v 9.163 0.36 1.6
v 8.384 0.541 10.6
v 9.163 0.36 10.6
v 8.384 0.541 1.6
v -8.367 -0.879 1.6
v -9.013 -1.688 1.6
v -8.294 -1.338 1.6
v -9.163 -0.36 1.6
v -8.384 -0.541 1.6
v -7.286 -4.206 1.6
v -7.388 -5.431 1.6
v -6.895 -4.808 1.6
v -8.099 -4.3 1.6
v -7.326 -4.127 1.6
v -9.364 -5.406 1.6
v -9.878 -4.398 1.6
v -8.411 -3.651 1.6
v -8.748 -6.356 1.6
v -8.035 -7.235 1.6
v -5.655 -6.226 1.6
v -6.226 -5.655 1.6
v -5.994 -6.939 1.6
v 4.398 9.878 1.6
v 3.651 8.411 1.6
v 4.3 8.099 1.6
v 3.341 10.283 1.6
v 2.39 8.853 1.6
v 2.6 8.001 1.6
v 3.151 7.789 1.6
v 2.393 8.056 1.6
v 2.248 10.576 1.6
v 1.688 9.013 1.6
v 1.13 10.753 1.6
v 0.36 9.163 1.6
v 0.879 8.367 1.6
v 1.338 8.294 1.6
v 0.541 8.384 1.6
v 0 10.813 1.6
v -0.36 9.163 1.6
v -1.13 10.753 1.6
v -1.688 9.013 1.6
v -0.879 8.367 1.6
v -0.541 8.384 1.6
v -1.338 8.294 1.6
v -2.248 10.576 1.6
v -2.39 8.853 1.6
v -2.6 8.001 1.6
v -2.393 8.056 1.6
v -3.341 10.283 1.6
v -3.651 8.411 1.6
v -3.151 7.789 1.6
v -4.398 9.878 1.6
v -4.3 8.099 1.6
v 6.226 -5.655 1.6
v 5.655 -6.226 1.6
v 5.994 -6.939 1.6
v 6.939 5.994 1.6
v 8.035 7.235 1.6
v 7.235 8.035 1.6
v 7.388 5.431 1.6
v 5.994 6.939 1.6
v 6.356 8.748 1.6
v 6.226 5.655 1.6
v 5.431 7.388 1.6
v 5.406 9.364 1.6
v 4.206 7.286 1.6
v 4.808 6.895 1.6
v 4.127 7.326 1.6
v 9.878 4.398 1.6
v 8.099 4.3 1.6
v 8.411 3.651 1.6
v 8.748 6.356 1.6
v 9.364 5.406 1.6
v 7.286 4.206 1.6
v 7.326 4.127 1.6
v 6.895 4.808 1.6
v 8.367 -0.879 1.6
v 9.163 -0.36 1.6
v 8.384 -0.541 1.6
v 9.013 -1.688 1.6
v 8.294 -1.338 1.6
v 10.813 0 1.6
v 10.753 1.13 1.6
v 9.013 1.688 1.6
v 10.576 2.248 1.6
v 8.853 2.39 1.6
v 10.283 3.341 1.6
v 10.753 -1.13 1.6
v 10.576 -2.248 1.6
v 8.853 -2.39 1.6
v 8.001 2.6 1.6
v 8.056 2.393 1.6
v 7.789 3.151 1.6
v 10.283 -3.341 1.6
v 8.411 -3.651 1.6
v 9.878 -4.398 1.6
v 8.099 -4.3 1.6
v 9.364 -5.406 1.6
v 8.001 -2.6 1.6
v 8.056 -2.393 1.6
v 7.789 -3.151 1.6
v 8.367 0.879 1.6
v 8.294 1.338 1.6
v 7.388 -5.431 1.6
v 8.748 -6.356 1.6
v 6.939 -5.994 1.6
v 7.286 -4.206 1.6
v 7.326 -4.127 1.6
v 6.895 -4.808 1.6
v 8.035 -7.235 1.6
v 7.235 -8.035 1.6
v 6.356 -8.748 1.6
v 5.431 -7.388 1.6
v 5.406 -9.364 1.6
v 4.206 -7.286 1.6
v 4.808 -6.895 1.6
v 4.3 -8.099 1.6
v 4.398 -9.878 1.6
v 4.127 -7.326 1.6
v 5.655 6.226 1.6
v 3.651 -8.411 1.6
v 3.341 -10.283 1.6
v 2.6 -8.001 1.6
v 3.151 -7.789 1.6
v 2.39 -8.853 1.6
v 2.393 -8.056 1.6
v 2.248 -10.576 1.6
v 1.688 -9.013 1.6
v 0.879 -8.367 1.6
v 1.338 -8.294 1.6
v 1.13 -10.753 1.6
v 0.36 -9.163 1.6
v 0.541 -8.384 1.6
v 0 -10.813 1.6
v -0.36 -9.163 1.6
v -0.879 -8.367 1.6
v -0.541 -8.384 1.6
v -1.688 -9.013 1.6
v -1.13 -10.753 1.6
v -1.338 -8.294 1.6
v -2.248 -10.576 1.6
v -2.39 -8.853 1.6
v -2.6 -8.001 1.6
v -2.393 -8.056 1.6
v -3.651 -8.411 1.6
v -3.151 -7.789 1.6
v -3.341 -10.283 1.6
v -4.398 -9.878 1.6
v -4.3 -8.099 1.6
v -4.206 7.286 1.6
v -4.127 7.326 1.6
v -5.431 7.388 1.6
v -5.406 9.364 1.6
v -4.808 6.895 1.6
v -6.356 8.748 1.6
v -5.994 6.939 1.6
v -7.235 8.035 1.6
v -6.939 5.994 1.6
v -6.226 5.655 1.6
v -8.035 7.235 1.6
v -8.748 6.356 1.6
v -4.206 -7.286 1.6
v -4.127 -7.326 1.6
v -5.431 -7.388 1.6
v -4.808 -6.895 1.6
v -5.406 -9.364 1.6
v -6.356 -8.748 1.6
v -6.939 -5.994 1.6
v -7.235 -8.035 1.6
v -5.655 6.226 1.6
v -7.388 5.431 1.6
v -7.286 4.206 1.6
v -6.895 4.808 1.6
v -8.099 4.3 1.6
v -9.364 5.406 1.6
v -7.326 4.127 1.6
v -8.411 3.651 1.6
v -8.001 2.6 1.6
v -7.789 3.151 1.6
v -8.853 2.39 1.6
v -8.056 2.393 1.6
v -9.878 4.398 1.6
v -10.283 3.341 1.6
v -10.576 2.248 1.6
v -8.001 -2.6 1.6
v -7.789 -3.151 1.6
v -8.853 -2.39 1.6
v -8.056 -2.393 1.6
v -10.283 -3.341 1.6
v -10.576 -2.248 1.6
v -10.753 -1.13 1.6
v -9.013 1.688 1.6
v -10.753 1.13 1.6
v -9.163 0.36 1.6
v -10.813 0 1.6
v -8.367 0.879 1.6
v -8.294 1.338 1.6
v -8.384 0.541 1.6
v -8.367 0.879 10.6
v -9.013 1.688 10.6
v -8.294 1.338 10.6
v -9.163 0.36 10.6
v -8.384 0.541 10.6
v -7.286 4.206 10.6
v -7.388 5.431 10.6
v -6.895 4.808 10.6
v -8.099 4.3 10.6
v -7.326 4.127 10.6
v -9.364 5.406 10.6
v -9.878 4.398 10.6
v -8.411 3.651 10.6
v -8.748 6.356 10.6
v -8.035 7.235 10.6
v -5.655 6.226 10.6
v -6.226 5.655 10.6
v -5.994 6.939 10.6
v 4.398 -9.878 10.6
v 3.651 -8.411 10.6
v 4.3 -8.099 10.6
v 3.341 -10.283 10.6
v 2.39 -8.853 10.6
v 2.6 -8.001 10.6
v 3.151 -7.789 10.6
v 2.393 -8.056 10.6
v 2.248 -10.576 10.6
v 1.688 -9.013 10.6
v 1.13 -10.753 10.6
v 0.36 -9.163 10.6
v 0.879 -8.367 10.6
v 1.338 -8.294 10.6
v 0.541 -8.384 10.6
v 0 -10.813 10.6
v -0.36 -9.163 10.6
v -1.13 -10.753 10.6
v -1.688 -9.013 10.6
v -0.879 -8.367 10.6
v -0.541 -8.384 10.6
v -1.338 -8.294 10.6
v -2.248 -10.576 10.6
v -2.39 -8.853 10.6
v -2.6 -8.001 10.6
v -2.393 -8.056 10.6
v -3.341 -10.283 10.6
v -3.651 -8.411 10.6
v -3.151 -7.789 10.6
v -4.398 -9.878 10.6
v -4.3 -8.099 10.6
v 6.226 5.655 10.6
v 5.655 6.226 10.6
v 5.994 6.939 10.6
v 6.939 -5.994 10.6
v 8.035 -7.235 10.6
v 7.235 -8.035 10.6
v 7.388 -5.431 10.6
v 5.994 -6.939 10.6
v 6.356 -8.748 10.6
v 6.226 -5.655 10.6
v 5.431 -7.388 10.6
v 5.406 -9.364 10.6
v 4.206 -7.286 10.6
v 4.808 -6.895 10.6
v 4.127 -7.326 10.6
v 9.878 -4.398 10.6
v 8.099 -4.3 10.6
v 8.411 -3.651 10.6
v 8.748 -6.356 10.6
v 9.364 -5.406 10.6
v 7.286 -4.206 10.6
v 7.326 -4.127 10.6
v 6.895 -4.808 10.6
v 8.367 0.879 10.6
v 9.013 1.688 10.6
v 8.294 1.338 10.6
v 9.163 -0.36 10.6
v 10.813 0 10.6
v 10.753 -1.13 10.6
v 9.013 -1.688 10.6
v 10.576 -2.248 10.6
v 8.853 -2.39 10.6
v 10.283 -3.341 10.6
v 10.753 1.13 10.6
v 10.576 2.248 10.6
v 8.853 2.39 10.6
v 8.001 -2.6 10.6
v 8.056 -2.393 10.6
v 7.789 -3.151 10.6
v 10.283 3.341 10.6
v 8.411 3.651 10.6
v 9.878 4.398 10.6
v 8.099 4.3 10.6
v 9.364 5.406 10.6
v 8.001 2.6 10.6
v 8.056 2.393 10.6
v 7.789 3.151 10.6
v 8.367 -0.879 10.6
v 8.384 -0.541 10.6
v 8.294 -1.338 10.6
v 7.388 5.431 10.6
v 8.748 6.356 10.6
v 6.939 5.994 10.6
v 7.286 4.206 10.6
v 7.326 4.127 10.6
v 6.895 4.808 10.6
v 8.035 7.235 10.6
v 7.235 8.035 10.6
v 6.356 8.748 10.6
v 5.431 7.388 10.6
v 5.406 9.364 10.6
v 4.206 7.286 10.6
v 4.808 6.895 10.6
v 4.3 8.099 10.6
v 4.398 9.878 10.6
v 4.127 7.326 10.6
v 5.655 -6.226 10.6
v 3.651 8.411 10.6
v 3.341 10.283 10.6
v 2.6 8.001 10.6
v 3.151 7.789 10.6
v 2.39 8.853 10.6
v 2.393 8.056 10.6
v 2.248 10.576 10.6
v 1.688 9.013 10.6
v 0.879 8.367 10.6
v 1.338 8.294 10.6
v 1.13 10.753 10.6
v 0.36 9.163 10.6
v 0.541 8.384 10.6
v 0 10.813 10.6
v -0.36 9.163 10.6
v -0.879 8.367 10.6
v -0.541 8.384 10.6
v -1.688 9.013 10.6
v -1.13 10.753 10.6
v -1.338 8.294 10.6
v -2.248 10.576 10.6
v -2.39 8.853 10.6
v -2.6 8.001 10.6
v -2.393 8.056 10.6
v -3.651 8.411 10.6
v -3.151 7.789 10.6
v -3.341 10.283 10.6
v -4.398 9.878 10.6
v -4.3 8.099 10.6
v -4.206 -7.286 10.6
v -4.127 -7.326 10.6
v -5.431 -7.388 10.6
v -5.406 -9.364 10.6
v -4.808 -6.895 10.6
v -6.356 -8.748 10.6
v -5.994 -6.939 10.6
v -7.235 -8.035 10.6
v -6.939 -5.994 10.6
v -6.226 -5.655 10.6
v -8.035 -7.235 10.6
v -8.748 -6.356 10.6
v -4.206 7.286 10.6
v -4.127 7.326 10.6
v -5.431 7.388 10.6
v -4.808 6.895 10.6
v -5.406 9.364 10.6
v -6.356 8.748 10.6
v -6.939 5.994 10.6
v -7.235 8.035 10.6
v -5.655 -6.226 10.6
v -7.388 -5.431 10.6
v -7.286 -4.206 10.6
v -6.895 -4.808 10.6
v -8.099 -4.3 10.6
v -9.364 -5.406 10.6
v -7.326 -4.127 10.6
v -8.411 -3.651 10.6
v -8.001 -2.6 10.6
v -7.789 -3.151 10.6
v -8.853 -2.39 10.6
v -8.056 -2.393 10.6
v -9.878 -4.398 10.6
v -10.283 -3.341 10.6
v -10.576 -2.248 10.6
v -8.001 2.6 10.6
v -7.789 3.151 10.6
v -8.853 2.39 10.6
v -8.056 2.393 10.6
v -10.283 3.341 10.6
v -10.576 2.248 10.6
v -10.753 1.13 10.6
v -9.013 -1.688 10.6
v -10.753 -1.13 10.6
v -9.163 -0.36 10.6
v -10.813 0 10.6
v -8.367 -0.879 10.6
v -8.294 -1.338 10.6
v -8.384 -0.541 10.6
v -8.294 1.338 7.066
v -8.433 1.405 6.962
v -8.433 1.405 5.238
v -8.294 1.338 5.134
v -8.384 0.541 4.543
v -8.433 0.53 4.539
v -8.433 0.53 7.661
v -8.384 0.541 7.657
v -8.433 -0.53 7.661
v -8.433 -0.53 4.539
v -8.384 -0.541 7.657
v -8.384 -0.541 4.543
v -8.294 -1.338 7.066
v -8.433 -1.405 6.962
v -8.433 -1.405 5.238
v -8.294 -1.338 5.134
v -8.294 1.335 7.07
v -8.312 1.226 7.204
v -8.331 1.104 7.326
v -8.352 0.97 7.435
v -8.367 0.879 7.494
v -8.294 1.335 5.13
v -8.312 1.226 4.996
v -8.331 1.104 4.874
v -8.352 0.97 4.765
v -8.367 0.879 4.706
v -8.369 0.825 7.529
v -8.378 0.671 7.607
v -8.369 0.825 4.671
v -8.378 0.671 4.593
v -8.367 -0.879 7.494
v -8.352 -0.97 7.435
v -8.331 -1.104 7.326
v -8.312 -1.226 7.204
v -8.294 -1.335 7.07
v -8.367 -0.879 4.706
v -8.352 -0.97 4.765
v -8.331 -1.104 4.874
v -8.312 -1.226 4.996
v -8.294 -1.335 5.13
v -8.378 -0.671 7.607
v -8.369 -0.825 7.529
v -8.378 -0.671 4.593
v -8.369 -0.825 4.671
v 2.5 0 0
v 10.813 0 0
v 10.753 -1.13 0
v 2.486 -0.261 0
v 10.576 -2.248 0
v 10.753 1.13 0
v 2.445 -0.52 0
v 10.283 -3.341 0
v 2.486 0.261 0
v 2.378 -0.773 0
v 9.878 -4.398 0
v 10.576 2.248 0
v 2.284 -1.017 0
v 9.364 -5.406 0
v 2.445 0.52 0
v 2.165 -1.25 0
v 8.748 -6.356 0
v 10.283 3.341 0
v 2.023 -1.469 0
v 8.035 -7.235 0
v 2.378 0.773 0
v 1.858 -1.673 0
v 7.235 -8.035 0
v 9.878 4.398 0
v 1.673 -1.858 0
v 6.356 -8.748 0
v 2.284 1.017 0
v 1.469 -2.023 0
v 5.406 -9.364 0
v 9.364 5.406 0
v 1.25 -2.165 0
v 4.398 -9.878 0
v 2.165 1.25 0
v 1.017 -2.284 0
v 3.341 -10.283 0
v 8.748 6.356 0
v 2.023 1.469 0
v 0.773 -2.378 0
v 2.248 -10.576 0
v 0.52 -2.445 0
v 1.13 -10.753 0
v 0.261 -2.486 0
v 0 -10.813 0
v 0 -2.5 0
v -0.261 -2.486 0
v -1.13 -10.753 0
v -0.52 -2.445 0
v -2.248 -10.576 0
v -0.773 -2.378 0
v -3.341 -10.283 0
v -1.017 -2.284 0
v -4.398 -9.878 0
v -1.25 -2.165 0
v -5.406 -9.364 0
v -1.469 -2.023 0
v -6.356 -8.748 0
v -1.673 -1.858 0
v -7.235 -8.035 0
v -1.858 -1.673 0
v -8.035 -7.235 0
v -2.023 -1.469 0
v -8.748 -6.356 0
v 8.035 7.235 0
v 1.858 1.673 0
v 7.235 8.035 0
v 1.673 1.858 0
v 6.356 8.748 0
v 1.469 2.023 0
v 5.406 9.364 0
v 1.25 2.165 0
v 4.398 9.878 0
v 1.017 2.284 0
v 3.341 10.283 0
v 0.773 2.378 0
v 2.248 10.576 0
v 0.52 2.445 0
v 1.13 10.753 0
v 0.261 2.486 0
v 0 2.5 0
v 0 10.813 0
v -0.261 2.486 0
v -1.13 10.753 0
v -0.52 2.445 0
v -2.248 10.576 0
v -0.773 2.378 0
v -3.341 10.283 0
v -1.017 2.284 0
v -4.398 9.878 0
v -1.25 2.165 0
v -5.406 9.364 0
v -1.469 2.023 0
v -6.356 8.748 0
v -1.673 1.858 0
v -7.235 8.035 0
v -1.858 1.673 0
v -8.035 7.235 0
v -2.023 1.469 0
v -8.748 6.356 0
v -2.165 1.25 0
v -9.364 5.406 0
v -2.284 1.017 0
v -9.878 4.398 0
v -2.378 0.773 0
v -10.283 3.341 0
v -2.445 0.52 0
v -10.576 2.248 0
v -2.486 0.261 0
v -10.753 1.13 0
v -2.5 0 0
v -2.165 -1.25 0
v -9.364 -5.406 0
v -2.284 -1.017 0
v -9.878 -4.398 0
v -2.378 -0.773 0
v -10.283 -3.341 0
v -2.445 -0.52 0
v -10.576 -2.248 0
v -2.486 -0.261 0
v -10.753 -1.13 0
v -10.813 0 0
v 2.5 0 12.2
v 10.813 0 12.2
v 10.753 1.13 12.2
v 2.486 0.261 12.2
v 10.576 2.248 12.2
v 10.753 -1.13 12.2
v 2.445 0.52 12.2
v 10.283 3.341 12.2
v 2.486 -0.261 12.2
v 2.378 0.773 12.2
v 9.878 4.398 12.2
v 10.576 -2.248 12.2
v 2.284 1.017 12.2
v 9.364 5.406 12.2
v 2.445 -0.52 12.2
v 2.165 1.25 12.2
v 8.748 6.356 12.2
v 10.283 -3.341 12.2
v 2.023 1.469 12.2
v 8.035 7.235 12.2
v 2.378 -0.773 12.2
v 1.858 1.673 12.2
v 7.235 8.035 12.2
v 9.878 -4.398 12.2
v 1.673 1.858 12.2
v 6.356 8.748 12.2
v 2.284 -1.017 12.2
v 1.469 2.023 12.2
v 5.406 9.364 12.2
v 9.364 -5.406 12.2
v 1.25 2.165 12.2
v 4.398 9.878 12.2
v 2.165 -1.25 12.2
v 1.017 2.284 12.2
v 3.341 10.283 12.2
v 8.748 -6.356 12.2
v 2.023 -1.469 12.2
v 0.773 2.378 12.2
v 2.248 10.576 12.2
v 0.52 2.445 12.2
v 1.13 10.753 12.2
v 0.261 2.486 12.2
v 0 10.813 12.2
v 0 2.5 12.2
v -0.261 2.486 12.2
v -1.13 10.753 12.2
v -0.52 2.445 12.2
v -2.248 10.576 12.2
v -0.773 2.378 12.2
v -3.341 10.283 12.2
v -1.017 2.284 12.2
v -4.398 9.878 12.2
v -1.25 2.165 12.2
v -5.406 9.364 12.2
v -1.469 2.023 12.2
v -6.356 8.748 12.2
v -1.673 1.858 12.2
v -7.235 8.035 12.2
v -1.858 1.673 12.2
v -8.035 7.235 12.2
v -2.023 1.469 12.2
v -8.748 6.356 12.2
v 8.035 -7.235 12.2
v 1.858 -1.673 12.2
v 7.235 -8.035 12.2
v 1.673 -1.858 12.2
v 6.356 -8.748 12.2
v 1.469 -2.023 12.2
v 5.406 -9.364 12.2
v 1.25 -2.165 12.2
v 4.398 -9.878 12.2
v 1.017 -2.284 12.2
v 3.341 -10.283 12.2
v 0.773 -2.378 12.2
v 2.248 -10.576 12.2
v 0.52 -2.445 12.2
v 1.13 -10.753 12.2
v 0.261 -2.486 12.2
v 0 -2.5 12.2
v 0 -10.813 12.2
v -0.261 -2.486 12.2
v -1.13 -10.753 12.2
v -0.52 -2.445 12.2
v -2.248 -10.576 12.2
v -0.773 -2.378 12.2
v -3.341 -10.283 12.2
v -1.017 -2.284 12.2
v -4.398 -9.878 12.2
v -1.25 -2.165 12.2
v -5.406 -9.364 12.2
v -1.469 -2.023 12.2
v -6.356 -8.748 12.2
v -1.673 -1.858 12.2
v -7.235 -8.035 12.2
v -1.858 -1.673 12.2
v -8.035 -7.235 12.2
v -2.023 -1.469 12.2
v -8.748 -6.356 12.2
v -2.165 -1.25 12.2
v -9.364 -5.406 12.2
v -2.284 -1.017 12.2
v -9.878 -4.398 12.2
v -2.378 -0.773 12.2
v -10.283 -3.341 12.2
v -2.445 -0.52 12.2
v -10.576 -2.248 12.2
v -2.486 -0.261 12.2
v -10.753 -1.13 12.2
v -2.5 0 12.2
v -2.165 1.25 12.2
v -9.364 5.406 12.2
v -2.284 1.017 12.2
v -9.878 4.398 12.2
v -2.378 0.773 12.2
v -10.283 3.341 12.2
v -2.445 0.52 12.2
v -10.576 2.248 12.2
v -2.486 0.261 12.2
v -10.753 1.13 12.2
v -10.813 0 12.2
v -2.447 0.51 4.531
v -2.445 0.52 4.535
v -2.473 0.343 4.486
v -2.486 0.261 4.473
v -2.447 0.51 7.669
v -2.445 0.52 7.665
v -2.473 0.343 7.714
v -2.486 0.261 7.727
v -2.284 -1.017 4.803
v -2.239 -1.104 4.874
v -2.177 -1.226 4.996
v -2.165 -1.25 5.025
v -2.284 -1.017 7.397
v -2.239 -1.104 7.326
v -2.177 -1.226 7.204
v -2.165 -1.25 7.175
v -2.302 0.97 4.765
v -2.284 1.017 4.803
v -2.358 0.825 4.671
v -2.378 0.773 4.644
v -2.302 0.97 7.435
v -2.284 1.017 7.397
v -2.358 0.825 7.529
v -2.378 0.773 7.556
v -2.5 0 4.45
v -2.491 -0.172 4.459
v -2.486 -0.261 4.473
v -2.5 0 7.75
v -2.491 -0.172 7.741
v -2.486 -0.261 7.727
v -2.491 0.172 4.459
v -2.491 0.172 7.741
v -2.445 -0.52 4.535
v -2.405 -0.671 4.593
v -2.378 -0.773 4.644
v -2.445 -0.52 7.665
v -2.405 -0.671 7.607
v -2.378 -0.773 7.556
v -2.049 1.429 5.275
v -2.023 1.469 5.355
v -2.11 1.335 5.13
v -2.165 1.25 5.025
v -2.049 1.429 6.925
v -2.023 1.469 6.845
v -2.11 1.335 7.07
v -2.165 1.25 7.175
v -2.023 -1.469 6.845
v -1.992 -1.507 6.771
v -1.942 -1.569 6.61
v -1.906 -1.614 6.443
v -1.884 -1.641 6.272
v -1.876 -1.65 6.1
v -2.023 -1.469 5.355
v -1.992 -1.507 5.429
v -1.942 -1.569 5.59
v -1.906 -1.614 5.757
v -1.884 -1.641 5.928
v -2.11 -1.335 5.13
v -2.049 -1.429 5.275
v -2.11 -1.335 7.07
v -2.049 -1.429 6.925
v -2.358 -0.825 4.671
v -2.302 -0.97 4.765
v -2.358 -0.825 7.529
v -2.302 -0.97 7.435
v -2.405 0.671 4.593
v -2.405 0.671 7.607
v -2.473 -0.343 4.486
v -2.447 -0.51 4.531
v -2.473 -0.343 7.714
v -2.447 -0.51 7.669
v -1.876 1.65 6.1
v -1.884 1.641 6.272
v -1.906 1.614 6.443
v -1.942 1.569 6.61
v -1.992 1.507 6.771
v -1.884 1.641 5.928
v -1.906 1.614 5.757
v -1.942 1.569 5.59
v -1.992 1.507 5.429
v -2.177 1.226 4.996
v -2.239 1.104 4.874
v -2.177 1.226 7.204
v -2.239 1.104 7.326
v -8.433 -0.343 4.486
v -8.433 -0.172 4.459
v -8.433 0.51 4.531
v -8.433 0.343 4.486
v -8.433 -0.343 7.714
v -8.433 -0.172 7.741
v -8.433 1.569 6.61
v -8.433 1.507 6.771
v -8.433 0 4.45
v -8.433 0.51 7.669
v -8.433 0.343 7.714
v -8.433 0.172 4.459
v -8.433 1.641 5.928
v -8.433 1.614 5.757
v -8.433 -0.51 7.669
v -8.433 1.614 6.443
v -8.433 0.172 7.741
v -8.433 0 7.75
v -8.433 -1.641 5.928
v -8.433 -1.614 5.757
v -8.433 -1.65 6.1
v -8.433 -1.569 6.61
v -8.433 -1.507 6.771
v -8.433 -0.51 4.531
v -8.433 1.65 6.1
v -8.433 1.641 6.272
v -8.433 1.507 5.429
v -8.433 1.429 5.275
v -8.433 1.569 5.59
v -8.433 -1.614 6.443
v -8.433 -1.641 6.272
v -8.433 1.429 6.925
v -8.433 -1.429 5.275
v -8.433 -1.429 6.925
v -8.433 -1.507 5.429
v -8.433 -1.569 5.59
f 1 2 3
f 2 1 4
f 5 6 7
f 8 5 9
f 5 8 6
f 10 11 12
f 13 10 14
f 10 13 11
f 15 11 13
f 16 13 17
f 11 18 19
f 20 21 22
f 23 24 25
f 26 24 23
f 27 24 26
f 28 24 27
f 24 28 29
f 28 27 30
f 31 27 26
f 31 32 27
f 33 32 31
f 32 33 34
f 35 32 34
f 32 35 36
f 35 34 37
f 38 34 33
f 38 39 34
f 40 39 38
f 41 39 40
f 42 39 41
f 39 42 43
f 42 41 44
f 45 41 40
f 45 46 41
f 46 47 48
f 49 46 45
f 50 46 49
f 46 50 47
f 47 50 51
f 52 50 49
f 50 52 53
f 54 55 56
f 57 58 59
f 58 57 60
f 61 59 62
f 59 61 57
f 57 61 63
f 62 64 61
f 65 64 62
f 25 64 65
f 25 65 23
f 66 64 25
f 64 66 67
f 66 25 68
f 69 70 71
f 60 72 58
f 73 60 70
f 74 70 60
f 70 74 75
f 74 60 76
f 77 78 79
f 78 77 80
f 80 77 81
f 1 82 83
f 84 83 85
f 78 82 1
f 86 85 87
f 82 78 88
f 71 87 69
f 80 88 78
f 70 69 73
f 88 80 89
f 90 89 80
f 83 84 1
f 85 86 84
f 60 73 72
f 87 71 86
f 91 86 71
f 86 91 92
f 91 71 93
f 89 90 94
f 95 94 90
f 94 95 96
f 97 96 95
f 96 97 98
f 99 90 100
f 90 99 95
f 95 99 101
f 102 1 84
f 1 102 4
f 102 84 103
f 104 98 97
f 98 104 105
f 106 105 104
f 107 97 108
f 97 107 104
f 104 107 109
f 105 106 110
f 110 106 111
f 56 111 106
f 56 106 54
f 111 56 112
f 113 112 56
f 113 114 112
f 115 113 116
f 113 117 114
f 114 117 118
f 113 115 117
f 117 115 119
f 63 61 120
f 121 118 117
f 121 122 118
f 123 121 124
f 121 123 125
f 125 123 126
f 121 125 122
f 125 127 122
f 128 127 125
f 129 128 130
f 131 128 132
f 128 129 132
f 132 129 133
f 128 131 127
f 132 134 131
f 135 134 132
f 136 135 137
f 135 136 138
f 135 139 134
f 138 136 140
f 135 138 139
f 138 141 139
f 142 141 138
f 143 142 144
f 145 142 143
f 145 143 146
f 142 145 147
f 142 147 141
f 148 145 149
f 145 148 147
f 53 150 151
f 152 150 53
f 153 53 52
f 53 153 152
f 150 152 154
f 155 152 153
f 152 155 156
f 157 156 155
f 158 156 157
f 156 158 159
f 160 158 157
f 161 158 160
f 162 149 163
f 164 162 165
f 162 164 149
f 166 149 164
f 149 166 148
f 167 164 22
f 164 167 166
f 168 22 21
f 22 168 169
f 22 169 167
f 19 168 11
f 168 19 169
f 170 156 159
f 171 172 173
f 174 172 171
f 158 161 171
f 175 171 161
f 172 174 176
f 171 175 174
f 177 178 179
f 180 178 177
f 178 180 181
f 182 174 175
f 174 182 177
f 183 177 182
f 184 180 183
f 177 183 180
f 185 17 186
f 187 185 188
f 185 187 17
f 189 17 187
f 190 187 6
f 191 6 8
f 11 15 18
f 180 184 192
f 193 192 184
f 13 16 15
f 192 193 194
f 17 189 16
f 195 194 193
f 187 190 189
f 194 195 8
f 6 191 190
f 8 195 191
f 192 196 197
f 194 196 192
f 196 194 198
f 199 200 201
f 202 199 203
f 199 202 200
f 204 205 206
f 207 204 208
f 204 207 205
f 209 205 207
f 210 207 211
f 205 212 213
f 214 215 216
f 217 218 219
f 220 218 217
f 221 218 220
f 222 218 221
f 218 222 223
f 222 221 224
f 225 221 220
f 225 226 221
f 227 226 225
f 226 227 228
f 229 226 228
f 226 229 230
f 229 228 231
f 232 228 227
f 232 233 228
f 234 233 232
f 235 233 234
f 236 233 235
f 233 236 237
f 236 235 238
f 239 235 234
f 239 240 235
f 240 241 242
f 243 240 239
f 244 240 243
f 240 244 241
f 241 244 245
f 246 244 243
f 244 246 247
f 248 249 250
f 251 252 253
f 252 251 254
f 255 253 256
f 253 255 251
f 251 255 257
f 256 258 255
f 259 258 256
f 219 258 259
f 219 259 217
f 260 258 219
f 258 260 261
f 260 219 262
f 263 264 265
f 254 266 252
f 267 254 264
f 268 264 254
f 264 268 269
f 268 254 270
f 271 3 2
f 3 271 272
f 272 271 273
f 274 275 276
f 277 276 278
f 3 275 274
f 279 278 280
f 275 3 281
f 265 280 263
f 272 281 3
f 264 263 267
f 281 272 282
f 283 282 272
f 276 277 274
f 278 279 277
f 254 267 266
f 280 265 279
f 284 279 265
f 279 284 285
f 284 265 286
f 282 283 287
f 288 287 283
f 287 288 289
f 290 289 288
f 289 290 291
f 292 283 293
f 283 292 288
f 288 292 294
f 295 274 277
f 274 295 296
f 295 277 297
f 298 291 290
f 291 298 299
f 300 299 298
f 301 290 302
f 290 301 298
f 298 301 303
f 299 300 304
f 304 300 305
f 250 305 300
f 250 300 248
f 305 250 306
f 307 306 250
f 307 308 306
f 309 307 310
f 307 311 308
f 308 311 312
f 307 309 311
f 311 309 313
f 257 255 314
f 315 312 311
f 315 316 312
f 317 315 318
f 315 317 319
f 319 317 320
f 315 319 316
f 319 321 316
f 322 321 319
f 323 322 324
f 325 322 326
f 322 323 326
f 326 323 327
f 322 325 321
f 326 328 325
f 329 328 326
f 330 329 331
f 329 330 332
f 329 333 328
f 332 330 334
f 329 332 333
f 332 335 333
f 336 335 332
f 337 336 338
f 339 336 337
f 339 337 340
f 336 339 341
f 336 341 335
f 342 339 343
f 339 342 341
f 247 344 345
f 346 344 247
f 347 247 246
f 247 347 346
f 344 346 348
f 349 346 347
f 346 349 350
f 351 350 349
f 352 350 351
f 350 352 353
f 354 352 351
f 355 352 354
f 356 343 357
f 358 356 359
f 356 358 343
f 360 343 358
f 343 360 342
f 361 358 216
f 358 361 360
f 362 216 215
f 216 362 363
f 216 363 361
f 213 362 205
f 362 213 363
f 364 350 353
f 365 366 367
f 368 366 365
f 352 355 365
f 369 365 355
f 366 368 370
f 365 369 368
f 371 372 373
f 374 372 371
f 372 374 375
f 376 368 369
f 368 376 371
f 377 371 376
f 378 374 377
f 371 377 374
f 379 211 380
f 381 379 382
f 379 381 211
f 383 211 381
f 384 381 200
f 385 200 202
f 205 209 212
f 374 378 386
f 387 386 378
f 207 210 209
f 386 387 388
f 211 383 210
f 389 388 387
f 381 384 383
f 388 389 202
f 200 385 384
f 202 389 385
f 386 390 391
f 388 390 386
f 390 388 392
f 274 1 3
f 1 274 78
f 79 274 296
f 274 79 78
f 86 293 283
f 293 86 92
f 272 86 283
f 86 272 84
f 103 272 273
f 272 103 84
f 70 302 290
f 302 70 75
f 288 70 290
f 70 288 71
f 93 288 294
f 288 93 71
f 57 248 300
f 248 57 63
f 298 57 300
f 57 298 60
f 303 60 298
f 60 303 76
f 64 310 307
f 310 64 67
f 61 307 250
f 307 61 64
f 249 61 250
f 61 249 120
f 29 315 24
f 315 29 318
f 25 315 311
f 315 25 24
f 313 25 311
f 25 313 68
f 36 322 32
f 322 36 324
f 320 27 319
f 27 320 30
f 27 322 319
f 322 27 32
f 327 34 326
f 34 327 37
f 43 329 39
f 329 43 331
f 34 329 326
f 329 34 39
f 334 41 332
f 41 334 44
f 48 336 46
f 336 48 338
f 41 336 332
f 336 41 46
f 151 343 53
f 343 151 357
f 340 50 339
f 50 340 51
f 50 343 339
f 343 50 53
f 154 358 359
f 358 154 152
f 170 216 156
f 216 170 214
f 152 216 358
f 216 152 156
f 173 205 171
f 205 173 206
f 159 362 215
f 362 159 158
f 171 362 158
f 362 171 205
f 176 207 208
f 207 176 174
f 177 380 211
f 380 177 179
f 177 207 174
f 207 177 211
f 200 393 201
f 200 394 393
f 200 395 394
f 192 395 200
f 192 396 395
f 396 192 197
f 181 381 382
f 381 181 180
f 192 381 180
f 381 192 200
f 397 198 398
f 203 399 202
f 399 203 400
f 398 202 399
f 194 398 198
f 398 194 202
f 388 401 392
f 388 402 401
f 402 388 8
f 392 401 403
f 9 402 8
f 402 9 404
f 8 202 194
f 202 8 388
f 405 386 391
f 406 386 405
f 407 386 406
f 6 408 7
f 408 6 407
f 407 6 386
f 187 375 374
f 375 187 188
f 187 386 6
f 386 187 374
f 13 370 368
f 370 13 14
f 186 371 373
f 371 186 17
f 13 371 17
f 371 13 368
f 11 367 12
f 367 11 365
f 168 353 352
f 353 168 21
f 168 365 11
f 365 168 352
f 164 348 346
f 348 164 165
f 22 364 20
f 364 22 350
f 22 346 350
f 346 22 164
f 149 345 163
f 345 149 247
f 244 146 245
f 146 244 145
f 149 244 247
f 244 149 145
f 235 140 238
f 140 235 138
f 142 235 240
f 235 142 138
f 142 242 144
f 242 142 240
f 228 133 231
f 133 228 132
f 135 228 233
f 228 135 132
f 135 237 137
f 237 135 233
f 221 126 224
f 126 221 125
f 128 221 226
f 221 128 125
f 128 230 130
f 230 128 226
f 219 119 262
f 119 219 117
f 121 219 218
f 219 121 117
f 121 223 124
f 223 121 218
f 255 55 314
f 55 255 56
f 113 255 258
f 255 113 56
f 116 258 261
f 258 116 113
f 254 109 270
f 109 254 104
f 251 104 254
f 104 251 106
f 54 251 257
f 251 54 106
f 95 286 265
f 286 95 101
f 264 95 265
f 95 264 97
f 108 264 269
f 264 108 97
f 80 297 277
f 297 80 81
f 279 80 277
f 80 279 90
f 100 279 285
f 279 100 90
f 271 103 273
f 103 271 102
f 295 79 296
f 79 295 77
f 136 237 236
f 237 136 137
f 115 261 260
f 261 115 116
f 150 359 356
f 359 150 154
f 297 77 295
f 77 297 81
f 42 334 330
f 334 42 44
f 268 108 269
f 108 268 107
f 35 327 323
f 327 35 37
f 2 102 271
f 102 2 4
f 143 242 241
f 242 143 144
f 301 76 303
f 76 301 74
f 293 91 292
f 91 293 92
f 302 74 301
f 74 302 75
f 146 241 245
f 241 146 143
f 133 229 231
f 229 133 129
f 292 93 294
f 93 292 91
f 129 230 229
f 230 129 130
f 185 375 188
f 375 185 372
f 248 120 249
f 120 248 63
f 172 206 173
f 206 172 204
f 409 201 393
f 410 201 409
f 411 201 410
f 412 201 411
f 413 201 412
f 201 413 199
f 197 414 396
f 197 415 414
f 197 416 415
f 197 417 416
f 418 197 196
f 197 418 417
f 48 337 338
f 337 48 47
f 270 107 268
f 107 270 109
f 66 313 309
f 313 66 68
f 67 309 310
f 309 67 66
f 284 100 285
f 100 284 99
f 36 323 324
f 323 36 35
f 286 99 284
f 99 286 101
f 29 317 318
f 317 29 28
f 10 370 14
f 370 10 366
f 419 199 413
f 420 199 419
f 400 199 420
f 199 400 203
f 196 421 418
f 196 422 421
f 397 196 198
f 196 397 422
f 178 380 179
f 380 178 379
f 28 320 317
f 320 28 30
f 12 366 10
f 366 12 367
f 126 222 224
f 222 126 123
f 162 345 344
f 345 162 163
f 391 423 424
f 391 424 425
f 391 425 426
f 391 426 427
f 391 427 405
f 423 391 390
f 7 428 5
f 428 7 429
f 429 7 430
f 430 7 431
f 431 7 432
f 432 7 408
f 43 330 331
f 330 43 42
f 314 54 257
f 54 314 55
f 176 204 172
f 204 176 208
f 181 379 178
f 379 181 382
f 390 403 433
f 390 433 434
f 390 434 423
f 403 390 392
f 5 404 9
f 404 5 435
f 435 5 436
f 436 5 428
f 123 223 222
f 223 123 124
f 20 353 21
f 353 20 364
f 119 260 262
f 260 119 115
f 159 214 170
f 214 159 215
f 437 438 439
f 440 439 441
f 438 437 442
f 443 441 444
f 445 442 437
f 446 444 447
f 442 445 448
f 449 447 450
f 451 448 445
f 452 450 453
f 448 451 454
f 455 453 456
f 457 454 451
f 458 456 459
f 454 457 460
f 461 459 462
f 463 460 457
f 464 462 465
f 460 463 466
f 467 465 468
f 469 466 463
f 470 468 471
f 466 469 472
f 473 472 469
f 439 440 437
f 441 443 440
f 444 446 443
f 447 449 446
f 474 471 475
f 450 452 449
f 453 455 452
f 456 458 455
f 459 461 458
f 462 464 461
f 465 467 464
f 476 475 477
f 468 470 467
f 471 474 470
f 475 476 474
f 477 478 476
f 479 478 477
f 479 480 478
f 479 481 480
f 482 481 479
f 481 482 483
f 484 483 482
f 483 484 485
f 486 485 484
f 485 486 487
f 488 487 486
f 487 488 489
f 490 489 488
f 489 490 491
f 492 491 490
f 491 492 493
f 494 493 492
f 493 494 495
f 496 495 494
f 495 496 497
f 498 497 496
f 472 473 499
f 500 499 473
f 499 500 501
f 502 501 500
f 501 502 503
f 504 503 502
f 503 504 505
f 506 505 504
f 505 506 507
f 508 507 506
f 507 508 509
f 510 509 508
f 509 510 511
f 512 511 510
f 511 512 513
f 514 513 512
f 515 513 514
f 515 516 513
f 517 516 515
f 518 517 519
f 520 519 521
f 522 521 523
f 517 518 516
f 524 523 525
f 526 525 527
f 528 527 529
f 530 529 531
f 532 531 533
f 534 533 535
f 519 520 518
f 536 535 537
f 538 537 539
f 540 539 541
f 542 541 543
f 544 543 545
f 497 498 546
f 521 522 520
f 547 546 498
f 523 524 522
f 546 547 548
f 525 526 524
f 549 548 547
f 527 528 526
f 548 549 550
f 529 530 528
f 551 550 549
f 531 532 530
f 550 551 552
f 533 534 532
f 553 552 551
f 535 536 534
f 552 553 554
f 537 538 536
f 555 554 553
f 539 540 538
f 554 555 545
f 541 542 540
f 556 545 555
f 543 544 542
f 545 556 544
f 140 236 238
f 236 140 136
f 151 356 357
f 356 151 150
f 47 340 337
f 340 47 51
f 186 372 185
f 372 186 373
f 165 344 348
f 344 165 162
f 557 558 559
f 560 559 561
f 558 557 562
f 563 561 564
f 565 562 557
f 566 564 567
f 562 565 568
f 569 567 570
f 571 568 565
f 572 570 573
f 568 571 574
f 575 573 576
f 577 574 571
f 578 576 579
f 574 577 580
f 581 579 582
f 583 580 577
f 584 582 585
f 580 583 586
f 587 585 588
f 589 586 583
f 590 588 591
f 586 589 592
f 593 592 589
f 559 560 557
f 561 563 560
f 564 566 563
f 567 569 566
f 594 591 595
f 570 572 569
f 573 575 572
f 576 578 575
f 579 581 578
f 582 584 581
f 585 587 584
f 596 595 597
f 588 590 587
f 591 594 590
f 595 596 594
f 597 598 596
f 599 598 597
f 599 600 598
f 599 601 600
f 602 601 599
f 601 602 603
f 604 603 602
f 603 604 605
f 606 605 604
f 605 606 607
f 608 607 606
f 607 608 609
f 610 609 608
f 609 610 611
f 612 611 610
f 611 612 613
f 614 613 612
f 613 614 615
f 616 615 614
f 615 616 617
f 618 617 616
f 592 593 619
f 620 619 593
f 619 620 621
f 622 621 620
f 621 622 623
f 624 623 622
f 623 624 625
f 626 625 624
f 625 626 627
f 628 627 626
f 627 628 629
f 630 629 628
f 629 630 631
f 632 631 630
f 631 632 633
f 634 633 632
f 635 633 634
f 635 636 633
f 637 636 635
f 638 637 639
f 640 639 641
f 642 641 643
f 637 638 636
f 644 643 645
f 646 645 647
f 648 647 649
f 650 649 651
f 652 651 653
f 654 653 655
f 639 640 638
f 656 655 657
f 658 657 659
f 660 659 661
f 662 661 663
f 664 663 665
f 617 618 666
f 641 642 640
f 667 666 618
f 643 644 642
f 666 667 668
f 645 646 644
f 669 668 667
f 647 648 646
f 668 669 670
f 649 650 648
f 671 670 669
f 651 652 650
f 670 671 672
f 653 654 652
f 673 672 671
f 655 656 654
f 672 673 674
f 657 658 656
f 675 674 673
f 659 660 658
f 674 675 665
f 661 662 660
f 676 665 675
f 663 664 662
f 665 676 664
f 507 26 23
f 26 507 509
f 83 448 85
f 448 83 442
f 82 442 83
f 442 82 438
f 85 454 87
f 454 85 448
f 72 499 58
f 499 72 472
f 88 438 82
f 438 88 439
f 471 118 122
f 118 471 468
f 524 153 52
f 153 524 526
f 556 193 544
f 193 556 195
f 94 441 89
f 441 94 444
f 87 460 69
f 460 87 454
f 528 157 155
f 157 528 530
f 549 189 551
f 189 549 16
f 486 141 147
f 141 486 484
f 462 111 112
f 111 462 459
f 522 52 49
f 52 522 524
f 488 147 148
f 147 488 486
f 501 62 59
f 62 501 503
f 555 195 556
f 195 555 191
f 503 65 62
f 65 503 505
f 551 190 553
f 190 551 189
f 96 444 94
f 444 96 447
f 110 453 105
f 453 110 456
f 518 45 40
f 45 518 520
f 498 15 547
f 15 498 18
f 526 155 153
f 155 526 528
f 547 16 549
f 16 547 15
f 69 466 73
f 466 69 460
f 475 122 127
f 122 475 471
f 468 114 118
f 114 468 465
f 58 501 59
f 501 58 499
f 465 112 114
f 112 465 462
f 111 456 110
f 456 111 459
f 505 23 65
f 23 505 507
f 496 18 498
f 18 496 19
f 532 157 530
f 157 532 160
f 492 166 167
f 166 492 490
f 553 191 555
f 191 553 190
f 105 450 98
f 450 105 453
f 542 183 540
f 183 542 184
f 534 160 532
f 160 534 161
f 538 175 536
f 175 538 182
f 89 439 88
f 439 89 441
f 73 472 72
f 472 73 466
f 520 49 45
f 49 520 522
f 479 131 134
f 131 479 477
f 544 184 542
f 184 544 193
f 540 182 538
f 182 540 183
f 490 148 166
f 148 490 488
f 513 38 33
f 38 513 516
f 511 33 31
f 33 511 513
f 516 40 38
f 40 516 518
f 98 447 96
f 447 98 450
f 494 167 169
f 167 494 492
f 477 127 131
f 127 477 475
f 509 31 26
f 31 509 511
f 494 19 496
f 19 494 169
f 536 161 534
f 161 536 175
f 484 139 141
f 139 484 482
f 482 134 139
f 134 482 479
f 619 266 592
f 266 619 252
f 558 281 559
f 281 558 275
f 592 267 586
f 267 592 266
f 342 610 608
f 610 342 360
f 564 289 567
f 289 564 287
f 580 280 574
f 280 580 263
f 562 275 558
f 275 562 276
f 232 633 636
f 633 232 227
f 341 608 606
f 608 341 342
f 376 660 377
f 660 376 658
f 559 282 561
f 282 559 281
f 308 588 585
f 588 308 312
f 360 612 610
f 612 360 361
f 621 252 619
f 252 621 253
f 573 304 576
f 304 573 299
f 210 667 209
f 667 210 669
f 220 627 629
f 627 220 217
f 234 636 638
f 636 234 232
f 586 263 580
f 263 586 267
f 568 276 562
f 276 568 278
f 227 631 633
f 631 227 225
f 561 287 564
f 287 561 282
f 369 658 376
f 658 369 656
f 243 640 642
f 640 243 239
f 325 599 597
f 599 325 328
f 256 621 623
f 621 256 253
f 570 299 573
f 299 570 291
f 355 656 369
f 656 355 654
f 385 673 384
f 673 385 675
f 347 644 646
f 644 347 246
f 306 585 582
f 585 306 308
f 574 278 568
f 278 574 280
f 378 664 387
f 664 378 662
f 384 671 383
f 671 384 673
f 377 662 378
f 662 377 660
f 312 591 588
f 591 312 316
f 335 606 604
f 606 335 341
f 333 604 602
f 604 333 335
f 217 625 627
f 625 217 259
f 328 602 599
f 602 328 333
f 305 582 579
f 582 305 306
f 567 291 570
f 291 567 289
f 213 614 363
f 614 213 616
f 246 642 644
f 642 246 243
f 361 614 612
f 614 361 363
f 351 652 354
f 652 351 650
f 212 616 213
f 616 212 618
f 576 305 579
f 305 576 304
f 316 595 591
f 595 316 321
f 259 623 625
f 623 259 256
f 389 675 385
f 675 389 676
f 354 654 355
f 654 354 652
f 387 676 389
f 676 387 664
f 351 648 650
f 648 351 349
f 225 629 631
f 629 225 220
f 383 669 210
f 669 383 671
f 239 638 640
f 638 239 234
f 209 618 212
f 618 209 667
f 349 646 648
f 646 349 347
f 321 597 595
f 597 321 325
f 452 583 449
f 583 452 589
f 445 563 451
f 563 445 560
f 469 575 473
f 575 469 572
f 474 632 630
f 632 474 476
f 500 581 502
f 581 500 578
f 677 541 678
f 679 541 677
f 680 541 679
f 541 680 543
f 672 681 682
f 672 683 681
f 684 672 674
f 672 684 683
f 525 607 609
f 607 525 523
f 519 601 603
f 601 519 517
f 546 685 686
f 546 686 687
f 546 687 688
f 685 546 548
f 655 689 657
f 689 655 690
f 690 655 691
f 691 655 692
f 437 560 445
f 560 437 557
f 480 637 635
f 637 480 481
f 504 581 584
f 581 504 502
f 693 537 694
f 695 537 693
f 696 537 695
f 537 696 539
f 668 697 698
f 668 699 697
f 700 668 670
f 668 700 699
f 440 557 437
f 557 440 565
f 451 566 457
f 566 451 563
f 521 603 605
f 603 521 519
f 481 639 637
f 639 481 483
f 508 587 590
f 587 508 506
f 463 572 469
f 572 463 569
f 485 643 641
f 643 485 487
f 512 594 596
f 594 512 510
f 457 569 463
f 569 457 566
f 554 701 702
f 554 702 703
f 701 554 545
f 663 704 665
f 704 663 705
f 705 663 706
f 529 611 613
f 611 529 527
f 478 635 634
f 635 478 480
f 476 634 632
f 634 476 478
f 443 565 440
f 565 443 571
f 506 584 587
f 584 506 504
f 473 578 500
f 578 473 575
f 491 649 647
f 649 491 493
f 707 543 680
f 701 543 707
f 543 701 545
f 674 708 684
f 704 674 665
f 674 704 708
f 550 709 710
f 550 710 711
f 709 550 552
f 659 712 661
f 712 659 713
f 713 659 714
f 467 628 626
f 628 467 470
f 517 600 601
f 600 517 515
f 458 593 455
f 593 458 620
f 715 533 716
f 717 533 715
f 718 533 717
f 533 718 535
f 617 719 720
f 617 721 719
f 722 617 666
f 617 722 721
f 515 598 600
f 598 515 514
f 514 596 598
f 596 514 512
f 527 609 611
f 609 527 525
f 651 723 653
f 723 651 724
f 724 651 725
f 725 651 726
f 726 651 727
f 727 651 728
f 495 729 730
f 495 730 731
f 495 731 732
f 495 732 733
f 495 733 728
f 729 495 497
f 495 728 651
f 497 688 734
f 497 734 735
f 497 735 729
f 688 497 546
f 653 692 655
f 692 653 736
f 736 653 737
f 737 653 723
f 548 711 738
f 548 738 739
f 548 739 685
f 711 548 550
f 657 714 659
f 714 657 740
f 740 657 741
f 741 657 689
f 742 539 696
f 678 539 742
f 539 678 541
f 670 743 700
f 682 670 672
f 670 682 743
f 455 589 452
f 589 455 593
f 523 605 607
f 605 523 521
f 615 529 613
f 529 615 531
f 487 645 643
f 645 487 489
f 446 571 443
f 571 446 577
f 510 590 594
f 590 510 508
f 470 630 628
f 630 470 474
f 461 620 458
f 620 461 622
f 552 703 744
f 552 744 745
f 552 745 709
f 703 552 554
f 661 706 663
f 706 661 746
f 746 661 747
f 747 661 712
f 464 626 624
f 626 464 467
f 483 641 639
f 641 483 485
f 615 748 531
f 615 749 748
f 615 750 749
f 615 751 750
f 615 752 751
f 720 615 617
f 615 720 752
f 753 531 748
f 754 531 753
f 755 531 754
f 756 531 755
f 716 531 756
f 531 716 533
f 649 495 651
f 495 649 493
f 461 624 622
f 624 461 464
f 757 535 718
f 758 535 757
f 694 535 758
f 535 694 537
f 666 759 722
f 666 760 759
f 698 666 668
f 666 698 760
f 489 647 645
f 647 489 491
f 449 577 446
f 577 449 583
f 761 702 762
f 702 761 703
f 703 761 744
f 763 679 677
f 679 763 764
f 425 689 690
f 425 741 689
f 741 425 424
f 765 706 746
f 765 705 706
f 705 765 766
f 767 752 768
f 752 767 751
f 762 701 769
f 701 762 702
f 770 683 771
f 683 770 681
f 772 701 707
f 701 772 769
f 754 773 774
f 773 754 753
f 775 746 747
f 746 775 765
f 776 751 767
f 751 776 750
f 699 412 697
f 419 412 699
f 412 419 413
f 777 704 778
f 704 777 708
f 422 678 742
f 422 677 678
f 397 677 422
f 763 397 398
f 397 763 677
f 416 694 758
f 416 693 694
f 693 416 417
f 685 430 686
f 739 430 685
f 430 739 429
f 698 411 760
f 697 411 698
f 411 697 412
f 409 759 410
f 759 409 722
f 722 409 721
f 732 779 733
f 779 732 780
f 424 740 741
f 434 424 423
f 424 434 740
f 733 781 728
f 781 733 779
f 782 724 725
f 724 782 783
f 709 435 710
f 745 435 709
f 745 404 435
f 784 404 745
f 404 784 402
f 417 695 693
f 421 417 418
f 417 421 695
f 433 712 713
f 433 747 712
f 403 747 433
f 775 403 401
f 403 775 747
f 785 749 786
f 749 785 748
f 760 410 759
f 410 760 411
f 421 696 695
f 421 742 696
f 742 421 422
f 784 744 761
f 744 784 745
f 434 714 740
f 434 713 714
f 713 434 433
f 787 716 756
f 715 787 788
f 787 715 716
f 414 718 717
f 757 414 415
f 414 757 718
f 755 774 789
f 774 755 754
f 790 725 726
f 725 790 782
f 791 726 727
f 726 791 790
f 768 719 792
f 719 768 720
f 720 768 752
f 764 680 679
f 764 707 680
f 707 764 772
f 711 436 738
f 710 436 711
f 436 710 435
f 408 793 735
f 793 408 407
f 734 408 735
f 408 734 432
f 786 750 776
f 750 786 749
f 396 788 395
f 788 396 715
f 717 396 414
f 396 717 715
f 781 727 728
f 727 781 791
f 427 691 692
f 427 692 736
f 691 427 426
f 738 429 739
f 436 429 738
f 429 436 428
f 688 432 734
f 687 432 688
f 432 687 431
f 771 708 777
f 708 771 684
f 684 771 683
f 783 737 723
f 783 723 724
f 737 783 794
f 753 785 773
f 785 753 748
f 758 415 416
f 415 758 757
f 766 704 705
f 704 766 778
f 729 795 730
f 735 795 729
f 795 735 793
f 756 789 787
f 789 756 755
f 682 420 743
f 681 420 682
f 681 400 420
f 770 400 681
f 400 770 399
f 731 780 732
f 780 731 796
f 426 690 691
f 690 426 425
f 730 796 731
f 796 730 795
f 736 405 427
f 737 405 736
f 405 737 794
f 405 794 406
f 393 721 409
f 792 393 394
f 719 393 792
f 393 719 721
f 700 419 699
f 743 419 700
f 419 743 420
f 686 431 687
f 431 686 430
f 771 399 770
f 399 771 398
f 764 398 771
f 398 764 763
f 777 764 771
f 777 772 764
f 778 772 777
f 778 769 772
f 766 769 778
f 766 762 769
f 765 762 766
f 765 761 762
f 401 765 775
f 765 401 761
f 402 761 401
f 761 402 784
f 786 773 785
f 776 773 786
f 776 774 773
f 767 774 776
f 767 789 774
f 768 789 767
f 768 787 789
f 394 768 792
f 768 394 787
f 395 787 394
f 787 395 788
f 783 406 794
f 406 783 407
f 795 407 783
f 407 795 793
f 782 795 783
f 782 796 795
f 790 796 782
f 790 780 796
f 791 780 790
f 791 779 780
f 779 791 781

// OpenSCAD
// GT2 pulley, 28 teeth for 9 mm belt.
$fn = 60;
eps = 0.02;
teeth = 28;
belt_pitch = 2;
belt_w = 9;
shaft_d = 5;
set_screw_d = 3.3;
tooth_depth = 0.75;
tooth_overlap = 0.28;
tooth_base_w = 1.2;
tooth_tip_w = 0.72;
flange_t = 1.6;
core_d = teeth * belt_pitch / PI - 1.0;
body_h = belt_w + 2 * flange_t;
module tooth() {
    linear_extrude(height = belt_w)
        polygon(points = [[-tooth_overlap, -tooth_base_w / 2], [tooth_depth, -tooth_tip_w / 2], [tooth_depth, tooth_tip_w / 2], [-tooth_overlap, tooth_base_w / 2]]);
}
difference() {
    union() {
        cylinder(d = core_d, h = body_h);
        cylinder(d = core_d + 4.8, h = flange_t);
        translate([0, 0, body_h - flange_t]) cylinder(d = core_d + 4.8, h = flange_t);
        for (i = [0 : teeth - 1]) rotate([0, 0, i * 360 / teeth]) translate([core_d / 2, 0, flange_t]) tooth();
    }
    translate([0, 0, -eps]) cylinder(d = shaft_d, h = body_h + 2 * eps);
    translate([-core_d / 2 - eps, 0, body_h / 2]) rotate([0, 90, 0]) cylinder(d = set_screw_d, h = core_d / 2 + 2 * eps);
}
